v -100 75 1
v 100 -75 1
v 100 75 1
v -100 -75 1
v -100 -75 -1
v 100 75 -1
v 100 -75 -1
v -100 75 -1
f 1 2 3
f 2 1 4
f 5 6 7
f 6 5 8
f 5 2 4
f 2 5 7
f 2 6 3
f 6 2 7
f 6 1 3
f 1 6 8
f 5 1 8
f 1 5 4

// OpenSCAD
// Parameters
sheet_length = 200; //[100:400:1]
sheet_width = 150; //[75:300:1]
sheet_thickness = 2; //[1:4:0.5]

// Geometry
module sheet_body() {
  color([0.85, 0.85, 0.8]) // Off-white for 3D printed PLA
  translate([0, 0, 0])
    cube([sheet_length, sheet_width, sheet_thickness], center=true);
}

// Final Output
sheet_body();
